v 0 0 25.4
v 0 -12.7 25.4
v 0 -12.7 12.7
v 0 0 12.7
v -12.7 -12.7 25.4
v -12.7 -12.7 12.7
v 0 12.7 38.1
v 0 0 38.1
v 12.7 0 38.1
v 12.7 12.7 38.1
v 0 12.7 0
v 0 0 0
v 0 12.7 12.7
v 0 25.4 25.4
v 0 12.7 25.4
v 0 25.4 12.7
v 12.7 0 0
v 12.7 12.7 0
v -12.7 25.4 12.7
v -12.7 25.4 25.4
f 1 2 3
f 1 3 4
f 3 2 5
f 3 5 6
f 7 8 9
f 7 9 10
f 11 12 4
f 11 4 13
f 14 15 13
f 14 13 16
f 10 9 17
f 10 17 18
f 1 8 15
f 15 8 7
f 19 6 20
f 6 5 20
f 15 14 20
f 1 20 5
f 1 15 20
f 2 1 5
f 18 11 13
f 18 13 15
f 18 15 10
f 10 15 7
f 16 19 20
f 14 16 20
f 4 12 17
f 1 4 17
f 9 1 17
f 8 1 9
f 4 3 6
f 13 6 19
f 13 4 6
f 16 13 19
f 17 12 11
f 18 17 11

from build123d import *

# Parameters (mm, degrees)
F0_W     = 12.7
F0_H     = 38.1
F1_DEPTH = 12.7
F3_DEPTH = 12.7


with BuildPart() as f1:
    # F0 (on Right) → F1 (new body)
    with BuildSketch(Plane.YZ):
        with Locations((6.35, 19.05)):
            Rectangle(F0_W, F0_H)
    extrude(amount=F1_DEPTH)

    # F2 (on Right) → F3 (join)
    with BuildSketch(Plane.YZ):
        Polygon((-12.7, 12.7), (0, 12.7), (25.4, 12.7), (25.4, 25.4), (-12.7, 25.4), align=None)
    extrude(amount=-F3_DEPTH)


solid = f1.part
